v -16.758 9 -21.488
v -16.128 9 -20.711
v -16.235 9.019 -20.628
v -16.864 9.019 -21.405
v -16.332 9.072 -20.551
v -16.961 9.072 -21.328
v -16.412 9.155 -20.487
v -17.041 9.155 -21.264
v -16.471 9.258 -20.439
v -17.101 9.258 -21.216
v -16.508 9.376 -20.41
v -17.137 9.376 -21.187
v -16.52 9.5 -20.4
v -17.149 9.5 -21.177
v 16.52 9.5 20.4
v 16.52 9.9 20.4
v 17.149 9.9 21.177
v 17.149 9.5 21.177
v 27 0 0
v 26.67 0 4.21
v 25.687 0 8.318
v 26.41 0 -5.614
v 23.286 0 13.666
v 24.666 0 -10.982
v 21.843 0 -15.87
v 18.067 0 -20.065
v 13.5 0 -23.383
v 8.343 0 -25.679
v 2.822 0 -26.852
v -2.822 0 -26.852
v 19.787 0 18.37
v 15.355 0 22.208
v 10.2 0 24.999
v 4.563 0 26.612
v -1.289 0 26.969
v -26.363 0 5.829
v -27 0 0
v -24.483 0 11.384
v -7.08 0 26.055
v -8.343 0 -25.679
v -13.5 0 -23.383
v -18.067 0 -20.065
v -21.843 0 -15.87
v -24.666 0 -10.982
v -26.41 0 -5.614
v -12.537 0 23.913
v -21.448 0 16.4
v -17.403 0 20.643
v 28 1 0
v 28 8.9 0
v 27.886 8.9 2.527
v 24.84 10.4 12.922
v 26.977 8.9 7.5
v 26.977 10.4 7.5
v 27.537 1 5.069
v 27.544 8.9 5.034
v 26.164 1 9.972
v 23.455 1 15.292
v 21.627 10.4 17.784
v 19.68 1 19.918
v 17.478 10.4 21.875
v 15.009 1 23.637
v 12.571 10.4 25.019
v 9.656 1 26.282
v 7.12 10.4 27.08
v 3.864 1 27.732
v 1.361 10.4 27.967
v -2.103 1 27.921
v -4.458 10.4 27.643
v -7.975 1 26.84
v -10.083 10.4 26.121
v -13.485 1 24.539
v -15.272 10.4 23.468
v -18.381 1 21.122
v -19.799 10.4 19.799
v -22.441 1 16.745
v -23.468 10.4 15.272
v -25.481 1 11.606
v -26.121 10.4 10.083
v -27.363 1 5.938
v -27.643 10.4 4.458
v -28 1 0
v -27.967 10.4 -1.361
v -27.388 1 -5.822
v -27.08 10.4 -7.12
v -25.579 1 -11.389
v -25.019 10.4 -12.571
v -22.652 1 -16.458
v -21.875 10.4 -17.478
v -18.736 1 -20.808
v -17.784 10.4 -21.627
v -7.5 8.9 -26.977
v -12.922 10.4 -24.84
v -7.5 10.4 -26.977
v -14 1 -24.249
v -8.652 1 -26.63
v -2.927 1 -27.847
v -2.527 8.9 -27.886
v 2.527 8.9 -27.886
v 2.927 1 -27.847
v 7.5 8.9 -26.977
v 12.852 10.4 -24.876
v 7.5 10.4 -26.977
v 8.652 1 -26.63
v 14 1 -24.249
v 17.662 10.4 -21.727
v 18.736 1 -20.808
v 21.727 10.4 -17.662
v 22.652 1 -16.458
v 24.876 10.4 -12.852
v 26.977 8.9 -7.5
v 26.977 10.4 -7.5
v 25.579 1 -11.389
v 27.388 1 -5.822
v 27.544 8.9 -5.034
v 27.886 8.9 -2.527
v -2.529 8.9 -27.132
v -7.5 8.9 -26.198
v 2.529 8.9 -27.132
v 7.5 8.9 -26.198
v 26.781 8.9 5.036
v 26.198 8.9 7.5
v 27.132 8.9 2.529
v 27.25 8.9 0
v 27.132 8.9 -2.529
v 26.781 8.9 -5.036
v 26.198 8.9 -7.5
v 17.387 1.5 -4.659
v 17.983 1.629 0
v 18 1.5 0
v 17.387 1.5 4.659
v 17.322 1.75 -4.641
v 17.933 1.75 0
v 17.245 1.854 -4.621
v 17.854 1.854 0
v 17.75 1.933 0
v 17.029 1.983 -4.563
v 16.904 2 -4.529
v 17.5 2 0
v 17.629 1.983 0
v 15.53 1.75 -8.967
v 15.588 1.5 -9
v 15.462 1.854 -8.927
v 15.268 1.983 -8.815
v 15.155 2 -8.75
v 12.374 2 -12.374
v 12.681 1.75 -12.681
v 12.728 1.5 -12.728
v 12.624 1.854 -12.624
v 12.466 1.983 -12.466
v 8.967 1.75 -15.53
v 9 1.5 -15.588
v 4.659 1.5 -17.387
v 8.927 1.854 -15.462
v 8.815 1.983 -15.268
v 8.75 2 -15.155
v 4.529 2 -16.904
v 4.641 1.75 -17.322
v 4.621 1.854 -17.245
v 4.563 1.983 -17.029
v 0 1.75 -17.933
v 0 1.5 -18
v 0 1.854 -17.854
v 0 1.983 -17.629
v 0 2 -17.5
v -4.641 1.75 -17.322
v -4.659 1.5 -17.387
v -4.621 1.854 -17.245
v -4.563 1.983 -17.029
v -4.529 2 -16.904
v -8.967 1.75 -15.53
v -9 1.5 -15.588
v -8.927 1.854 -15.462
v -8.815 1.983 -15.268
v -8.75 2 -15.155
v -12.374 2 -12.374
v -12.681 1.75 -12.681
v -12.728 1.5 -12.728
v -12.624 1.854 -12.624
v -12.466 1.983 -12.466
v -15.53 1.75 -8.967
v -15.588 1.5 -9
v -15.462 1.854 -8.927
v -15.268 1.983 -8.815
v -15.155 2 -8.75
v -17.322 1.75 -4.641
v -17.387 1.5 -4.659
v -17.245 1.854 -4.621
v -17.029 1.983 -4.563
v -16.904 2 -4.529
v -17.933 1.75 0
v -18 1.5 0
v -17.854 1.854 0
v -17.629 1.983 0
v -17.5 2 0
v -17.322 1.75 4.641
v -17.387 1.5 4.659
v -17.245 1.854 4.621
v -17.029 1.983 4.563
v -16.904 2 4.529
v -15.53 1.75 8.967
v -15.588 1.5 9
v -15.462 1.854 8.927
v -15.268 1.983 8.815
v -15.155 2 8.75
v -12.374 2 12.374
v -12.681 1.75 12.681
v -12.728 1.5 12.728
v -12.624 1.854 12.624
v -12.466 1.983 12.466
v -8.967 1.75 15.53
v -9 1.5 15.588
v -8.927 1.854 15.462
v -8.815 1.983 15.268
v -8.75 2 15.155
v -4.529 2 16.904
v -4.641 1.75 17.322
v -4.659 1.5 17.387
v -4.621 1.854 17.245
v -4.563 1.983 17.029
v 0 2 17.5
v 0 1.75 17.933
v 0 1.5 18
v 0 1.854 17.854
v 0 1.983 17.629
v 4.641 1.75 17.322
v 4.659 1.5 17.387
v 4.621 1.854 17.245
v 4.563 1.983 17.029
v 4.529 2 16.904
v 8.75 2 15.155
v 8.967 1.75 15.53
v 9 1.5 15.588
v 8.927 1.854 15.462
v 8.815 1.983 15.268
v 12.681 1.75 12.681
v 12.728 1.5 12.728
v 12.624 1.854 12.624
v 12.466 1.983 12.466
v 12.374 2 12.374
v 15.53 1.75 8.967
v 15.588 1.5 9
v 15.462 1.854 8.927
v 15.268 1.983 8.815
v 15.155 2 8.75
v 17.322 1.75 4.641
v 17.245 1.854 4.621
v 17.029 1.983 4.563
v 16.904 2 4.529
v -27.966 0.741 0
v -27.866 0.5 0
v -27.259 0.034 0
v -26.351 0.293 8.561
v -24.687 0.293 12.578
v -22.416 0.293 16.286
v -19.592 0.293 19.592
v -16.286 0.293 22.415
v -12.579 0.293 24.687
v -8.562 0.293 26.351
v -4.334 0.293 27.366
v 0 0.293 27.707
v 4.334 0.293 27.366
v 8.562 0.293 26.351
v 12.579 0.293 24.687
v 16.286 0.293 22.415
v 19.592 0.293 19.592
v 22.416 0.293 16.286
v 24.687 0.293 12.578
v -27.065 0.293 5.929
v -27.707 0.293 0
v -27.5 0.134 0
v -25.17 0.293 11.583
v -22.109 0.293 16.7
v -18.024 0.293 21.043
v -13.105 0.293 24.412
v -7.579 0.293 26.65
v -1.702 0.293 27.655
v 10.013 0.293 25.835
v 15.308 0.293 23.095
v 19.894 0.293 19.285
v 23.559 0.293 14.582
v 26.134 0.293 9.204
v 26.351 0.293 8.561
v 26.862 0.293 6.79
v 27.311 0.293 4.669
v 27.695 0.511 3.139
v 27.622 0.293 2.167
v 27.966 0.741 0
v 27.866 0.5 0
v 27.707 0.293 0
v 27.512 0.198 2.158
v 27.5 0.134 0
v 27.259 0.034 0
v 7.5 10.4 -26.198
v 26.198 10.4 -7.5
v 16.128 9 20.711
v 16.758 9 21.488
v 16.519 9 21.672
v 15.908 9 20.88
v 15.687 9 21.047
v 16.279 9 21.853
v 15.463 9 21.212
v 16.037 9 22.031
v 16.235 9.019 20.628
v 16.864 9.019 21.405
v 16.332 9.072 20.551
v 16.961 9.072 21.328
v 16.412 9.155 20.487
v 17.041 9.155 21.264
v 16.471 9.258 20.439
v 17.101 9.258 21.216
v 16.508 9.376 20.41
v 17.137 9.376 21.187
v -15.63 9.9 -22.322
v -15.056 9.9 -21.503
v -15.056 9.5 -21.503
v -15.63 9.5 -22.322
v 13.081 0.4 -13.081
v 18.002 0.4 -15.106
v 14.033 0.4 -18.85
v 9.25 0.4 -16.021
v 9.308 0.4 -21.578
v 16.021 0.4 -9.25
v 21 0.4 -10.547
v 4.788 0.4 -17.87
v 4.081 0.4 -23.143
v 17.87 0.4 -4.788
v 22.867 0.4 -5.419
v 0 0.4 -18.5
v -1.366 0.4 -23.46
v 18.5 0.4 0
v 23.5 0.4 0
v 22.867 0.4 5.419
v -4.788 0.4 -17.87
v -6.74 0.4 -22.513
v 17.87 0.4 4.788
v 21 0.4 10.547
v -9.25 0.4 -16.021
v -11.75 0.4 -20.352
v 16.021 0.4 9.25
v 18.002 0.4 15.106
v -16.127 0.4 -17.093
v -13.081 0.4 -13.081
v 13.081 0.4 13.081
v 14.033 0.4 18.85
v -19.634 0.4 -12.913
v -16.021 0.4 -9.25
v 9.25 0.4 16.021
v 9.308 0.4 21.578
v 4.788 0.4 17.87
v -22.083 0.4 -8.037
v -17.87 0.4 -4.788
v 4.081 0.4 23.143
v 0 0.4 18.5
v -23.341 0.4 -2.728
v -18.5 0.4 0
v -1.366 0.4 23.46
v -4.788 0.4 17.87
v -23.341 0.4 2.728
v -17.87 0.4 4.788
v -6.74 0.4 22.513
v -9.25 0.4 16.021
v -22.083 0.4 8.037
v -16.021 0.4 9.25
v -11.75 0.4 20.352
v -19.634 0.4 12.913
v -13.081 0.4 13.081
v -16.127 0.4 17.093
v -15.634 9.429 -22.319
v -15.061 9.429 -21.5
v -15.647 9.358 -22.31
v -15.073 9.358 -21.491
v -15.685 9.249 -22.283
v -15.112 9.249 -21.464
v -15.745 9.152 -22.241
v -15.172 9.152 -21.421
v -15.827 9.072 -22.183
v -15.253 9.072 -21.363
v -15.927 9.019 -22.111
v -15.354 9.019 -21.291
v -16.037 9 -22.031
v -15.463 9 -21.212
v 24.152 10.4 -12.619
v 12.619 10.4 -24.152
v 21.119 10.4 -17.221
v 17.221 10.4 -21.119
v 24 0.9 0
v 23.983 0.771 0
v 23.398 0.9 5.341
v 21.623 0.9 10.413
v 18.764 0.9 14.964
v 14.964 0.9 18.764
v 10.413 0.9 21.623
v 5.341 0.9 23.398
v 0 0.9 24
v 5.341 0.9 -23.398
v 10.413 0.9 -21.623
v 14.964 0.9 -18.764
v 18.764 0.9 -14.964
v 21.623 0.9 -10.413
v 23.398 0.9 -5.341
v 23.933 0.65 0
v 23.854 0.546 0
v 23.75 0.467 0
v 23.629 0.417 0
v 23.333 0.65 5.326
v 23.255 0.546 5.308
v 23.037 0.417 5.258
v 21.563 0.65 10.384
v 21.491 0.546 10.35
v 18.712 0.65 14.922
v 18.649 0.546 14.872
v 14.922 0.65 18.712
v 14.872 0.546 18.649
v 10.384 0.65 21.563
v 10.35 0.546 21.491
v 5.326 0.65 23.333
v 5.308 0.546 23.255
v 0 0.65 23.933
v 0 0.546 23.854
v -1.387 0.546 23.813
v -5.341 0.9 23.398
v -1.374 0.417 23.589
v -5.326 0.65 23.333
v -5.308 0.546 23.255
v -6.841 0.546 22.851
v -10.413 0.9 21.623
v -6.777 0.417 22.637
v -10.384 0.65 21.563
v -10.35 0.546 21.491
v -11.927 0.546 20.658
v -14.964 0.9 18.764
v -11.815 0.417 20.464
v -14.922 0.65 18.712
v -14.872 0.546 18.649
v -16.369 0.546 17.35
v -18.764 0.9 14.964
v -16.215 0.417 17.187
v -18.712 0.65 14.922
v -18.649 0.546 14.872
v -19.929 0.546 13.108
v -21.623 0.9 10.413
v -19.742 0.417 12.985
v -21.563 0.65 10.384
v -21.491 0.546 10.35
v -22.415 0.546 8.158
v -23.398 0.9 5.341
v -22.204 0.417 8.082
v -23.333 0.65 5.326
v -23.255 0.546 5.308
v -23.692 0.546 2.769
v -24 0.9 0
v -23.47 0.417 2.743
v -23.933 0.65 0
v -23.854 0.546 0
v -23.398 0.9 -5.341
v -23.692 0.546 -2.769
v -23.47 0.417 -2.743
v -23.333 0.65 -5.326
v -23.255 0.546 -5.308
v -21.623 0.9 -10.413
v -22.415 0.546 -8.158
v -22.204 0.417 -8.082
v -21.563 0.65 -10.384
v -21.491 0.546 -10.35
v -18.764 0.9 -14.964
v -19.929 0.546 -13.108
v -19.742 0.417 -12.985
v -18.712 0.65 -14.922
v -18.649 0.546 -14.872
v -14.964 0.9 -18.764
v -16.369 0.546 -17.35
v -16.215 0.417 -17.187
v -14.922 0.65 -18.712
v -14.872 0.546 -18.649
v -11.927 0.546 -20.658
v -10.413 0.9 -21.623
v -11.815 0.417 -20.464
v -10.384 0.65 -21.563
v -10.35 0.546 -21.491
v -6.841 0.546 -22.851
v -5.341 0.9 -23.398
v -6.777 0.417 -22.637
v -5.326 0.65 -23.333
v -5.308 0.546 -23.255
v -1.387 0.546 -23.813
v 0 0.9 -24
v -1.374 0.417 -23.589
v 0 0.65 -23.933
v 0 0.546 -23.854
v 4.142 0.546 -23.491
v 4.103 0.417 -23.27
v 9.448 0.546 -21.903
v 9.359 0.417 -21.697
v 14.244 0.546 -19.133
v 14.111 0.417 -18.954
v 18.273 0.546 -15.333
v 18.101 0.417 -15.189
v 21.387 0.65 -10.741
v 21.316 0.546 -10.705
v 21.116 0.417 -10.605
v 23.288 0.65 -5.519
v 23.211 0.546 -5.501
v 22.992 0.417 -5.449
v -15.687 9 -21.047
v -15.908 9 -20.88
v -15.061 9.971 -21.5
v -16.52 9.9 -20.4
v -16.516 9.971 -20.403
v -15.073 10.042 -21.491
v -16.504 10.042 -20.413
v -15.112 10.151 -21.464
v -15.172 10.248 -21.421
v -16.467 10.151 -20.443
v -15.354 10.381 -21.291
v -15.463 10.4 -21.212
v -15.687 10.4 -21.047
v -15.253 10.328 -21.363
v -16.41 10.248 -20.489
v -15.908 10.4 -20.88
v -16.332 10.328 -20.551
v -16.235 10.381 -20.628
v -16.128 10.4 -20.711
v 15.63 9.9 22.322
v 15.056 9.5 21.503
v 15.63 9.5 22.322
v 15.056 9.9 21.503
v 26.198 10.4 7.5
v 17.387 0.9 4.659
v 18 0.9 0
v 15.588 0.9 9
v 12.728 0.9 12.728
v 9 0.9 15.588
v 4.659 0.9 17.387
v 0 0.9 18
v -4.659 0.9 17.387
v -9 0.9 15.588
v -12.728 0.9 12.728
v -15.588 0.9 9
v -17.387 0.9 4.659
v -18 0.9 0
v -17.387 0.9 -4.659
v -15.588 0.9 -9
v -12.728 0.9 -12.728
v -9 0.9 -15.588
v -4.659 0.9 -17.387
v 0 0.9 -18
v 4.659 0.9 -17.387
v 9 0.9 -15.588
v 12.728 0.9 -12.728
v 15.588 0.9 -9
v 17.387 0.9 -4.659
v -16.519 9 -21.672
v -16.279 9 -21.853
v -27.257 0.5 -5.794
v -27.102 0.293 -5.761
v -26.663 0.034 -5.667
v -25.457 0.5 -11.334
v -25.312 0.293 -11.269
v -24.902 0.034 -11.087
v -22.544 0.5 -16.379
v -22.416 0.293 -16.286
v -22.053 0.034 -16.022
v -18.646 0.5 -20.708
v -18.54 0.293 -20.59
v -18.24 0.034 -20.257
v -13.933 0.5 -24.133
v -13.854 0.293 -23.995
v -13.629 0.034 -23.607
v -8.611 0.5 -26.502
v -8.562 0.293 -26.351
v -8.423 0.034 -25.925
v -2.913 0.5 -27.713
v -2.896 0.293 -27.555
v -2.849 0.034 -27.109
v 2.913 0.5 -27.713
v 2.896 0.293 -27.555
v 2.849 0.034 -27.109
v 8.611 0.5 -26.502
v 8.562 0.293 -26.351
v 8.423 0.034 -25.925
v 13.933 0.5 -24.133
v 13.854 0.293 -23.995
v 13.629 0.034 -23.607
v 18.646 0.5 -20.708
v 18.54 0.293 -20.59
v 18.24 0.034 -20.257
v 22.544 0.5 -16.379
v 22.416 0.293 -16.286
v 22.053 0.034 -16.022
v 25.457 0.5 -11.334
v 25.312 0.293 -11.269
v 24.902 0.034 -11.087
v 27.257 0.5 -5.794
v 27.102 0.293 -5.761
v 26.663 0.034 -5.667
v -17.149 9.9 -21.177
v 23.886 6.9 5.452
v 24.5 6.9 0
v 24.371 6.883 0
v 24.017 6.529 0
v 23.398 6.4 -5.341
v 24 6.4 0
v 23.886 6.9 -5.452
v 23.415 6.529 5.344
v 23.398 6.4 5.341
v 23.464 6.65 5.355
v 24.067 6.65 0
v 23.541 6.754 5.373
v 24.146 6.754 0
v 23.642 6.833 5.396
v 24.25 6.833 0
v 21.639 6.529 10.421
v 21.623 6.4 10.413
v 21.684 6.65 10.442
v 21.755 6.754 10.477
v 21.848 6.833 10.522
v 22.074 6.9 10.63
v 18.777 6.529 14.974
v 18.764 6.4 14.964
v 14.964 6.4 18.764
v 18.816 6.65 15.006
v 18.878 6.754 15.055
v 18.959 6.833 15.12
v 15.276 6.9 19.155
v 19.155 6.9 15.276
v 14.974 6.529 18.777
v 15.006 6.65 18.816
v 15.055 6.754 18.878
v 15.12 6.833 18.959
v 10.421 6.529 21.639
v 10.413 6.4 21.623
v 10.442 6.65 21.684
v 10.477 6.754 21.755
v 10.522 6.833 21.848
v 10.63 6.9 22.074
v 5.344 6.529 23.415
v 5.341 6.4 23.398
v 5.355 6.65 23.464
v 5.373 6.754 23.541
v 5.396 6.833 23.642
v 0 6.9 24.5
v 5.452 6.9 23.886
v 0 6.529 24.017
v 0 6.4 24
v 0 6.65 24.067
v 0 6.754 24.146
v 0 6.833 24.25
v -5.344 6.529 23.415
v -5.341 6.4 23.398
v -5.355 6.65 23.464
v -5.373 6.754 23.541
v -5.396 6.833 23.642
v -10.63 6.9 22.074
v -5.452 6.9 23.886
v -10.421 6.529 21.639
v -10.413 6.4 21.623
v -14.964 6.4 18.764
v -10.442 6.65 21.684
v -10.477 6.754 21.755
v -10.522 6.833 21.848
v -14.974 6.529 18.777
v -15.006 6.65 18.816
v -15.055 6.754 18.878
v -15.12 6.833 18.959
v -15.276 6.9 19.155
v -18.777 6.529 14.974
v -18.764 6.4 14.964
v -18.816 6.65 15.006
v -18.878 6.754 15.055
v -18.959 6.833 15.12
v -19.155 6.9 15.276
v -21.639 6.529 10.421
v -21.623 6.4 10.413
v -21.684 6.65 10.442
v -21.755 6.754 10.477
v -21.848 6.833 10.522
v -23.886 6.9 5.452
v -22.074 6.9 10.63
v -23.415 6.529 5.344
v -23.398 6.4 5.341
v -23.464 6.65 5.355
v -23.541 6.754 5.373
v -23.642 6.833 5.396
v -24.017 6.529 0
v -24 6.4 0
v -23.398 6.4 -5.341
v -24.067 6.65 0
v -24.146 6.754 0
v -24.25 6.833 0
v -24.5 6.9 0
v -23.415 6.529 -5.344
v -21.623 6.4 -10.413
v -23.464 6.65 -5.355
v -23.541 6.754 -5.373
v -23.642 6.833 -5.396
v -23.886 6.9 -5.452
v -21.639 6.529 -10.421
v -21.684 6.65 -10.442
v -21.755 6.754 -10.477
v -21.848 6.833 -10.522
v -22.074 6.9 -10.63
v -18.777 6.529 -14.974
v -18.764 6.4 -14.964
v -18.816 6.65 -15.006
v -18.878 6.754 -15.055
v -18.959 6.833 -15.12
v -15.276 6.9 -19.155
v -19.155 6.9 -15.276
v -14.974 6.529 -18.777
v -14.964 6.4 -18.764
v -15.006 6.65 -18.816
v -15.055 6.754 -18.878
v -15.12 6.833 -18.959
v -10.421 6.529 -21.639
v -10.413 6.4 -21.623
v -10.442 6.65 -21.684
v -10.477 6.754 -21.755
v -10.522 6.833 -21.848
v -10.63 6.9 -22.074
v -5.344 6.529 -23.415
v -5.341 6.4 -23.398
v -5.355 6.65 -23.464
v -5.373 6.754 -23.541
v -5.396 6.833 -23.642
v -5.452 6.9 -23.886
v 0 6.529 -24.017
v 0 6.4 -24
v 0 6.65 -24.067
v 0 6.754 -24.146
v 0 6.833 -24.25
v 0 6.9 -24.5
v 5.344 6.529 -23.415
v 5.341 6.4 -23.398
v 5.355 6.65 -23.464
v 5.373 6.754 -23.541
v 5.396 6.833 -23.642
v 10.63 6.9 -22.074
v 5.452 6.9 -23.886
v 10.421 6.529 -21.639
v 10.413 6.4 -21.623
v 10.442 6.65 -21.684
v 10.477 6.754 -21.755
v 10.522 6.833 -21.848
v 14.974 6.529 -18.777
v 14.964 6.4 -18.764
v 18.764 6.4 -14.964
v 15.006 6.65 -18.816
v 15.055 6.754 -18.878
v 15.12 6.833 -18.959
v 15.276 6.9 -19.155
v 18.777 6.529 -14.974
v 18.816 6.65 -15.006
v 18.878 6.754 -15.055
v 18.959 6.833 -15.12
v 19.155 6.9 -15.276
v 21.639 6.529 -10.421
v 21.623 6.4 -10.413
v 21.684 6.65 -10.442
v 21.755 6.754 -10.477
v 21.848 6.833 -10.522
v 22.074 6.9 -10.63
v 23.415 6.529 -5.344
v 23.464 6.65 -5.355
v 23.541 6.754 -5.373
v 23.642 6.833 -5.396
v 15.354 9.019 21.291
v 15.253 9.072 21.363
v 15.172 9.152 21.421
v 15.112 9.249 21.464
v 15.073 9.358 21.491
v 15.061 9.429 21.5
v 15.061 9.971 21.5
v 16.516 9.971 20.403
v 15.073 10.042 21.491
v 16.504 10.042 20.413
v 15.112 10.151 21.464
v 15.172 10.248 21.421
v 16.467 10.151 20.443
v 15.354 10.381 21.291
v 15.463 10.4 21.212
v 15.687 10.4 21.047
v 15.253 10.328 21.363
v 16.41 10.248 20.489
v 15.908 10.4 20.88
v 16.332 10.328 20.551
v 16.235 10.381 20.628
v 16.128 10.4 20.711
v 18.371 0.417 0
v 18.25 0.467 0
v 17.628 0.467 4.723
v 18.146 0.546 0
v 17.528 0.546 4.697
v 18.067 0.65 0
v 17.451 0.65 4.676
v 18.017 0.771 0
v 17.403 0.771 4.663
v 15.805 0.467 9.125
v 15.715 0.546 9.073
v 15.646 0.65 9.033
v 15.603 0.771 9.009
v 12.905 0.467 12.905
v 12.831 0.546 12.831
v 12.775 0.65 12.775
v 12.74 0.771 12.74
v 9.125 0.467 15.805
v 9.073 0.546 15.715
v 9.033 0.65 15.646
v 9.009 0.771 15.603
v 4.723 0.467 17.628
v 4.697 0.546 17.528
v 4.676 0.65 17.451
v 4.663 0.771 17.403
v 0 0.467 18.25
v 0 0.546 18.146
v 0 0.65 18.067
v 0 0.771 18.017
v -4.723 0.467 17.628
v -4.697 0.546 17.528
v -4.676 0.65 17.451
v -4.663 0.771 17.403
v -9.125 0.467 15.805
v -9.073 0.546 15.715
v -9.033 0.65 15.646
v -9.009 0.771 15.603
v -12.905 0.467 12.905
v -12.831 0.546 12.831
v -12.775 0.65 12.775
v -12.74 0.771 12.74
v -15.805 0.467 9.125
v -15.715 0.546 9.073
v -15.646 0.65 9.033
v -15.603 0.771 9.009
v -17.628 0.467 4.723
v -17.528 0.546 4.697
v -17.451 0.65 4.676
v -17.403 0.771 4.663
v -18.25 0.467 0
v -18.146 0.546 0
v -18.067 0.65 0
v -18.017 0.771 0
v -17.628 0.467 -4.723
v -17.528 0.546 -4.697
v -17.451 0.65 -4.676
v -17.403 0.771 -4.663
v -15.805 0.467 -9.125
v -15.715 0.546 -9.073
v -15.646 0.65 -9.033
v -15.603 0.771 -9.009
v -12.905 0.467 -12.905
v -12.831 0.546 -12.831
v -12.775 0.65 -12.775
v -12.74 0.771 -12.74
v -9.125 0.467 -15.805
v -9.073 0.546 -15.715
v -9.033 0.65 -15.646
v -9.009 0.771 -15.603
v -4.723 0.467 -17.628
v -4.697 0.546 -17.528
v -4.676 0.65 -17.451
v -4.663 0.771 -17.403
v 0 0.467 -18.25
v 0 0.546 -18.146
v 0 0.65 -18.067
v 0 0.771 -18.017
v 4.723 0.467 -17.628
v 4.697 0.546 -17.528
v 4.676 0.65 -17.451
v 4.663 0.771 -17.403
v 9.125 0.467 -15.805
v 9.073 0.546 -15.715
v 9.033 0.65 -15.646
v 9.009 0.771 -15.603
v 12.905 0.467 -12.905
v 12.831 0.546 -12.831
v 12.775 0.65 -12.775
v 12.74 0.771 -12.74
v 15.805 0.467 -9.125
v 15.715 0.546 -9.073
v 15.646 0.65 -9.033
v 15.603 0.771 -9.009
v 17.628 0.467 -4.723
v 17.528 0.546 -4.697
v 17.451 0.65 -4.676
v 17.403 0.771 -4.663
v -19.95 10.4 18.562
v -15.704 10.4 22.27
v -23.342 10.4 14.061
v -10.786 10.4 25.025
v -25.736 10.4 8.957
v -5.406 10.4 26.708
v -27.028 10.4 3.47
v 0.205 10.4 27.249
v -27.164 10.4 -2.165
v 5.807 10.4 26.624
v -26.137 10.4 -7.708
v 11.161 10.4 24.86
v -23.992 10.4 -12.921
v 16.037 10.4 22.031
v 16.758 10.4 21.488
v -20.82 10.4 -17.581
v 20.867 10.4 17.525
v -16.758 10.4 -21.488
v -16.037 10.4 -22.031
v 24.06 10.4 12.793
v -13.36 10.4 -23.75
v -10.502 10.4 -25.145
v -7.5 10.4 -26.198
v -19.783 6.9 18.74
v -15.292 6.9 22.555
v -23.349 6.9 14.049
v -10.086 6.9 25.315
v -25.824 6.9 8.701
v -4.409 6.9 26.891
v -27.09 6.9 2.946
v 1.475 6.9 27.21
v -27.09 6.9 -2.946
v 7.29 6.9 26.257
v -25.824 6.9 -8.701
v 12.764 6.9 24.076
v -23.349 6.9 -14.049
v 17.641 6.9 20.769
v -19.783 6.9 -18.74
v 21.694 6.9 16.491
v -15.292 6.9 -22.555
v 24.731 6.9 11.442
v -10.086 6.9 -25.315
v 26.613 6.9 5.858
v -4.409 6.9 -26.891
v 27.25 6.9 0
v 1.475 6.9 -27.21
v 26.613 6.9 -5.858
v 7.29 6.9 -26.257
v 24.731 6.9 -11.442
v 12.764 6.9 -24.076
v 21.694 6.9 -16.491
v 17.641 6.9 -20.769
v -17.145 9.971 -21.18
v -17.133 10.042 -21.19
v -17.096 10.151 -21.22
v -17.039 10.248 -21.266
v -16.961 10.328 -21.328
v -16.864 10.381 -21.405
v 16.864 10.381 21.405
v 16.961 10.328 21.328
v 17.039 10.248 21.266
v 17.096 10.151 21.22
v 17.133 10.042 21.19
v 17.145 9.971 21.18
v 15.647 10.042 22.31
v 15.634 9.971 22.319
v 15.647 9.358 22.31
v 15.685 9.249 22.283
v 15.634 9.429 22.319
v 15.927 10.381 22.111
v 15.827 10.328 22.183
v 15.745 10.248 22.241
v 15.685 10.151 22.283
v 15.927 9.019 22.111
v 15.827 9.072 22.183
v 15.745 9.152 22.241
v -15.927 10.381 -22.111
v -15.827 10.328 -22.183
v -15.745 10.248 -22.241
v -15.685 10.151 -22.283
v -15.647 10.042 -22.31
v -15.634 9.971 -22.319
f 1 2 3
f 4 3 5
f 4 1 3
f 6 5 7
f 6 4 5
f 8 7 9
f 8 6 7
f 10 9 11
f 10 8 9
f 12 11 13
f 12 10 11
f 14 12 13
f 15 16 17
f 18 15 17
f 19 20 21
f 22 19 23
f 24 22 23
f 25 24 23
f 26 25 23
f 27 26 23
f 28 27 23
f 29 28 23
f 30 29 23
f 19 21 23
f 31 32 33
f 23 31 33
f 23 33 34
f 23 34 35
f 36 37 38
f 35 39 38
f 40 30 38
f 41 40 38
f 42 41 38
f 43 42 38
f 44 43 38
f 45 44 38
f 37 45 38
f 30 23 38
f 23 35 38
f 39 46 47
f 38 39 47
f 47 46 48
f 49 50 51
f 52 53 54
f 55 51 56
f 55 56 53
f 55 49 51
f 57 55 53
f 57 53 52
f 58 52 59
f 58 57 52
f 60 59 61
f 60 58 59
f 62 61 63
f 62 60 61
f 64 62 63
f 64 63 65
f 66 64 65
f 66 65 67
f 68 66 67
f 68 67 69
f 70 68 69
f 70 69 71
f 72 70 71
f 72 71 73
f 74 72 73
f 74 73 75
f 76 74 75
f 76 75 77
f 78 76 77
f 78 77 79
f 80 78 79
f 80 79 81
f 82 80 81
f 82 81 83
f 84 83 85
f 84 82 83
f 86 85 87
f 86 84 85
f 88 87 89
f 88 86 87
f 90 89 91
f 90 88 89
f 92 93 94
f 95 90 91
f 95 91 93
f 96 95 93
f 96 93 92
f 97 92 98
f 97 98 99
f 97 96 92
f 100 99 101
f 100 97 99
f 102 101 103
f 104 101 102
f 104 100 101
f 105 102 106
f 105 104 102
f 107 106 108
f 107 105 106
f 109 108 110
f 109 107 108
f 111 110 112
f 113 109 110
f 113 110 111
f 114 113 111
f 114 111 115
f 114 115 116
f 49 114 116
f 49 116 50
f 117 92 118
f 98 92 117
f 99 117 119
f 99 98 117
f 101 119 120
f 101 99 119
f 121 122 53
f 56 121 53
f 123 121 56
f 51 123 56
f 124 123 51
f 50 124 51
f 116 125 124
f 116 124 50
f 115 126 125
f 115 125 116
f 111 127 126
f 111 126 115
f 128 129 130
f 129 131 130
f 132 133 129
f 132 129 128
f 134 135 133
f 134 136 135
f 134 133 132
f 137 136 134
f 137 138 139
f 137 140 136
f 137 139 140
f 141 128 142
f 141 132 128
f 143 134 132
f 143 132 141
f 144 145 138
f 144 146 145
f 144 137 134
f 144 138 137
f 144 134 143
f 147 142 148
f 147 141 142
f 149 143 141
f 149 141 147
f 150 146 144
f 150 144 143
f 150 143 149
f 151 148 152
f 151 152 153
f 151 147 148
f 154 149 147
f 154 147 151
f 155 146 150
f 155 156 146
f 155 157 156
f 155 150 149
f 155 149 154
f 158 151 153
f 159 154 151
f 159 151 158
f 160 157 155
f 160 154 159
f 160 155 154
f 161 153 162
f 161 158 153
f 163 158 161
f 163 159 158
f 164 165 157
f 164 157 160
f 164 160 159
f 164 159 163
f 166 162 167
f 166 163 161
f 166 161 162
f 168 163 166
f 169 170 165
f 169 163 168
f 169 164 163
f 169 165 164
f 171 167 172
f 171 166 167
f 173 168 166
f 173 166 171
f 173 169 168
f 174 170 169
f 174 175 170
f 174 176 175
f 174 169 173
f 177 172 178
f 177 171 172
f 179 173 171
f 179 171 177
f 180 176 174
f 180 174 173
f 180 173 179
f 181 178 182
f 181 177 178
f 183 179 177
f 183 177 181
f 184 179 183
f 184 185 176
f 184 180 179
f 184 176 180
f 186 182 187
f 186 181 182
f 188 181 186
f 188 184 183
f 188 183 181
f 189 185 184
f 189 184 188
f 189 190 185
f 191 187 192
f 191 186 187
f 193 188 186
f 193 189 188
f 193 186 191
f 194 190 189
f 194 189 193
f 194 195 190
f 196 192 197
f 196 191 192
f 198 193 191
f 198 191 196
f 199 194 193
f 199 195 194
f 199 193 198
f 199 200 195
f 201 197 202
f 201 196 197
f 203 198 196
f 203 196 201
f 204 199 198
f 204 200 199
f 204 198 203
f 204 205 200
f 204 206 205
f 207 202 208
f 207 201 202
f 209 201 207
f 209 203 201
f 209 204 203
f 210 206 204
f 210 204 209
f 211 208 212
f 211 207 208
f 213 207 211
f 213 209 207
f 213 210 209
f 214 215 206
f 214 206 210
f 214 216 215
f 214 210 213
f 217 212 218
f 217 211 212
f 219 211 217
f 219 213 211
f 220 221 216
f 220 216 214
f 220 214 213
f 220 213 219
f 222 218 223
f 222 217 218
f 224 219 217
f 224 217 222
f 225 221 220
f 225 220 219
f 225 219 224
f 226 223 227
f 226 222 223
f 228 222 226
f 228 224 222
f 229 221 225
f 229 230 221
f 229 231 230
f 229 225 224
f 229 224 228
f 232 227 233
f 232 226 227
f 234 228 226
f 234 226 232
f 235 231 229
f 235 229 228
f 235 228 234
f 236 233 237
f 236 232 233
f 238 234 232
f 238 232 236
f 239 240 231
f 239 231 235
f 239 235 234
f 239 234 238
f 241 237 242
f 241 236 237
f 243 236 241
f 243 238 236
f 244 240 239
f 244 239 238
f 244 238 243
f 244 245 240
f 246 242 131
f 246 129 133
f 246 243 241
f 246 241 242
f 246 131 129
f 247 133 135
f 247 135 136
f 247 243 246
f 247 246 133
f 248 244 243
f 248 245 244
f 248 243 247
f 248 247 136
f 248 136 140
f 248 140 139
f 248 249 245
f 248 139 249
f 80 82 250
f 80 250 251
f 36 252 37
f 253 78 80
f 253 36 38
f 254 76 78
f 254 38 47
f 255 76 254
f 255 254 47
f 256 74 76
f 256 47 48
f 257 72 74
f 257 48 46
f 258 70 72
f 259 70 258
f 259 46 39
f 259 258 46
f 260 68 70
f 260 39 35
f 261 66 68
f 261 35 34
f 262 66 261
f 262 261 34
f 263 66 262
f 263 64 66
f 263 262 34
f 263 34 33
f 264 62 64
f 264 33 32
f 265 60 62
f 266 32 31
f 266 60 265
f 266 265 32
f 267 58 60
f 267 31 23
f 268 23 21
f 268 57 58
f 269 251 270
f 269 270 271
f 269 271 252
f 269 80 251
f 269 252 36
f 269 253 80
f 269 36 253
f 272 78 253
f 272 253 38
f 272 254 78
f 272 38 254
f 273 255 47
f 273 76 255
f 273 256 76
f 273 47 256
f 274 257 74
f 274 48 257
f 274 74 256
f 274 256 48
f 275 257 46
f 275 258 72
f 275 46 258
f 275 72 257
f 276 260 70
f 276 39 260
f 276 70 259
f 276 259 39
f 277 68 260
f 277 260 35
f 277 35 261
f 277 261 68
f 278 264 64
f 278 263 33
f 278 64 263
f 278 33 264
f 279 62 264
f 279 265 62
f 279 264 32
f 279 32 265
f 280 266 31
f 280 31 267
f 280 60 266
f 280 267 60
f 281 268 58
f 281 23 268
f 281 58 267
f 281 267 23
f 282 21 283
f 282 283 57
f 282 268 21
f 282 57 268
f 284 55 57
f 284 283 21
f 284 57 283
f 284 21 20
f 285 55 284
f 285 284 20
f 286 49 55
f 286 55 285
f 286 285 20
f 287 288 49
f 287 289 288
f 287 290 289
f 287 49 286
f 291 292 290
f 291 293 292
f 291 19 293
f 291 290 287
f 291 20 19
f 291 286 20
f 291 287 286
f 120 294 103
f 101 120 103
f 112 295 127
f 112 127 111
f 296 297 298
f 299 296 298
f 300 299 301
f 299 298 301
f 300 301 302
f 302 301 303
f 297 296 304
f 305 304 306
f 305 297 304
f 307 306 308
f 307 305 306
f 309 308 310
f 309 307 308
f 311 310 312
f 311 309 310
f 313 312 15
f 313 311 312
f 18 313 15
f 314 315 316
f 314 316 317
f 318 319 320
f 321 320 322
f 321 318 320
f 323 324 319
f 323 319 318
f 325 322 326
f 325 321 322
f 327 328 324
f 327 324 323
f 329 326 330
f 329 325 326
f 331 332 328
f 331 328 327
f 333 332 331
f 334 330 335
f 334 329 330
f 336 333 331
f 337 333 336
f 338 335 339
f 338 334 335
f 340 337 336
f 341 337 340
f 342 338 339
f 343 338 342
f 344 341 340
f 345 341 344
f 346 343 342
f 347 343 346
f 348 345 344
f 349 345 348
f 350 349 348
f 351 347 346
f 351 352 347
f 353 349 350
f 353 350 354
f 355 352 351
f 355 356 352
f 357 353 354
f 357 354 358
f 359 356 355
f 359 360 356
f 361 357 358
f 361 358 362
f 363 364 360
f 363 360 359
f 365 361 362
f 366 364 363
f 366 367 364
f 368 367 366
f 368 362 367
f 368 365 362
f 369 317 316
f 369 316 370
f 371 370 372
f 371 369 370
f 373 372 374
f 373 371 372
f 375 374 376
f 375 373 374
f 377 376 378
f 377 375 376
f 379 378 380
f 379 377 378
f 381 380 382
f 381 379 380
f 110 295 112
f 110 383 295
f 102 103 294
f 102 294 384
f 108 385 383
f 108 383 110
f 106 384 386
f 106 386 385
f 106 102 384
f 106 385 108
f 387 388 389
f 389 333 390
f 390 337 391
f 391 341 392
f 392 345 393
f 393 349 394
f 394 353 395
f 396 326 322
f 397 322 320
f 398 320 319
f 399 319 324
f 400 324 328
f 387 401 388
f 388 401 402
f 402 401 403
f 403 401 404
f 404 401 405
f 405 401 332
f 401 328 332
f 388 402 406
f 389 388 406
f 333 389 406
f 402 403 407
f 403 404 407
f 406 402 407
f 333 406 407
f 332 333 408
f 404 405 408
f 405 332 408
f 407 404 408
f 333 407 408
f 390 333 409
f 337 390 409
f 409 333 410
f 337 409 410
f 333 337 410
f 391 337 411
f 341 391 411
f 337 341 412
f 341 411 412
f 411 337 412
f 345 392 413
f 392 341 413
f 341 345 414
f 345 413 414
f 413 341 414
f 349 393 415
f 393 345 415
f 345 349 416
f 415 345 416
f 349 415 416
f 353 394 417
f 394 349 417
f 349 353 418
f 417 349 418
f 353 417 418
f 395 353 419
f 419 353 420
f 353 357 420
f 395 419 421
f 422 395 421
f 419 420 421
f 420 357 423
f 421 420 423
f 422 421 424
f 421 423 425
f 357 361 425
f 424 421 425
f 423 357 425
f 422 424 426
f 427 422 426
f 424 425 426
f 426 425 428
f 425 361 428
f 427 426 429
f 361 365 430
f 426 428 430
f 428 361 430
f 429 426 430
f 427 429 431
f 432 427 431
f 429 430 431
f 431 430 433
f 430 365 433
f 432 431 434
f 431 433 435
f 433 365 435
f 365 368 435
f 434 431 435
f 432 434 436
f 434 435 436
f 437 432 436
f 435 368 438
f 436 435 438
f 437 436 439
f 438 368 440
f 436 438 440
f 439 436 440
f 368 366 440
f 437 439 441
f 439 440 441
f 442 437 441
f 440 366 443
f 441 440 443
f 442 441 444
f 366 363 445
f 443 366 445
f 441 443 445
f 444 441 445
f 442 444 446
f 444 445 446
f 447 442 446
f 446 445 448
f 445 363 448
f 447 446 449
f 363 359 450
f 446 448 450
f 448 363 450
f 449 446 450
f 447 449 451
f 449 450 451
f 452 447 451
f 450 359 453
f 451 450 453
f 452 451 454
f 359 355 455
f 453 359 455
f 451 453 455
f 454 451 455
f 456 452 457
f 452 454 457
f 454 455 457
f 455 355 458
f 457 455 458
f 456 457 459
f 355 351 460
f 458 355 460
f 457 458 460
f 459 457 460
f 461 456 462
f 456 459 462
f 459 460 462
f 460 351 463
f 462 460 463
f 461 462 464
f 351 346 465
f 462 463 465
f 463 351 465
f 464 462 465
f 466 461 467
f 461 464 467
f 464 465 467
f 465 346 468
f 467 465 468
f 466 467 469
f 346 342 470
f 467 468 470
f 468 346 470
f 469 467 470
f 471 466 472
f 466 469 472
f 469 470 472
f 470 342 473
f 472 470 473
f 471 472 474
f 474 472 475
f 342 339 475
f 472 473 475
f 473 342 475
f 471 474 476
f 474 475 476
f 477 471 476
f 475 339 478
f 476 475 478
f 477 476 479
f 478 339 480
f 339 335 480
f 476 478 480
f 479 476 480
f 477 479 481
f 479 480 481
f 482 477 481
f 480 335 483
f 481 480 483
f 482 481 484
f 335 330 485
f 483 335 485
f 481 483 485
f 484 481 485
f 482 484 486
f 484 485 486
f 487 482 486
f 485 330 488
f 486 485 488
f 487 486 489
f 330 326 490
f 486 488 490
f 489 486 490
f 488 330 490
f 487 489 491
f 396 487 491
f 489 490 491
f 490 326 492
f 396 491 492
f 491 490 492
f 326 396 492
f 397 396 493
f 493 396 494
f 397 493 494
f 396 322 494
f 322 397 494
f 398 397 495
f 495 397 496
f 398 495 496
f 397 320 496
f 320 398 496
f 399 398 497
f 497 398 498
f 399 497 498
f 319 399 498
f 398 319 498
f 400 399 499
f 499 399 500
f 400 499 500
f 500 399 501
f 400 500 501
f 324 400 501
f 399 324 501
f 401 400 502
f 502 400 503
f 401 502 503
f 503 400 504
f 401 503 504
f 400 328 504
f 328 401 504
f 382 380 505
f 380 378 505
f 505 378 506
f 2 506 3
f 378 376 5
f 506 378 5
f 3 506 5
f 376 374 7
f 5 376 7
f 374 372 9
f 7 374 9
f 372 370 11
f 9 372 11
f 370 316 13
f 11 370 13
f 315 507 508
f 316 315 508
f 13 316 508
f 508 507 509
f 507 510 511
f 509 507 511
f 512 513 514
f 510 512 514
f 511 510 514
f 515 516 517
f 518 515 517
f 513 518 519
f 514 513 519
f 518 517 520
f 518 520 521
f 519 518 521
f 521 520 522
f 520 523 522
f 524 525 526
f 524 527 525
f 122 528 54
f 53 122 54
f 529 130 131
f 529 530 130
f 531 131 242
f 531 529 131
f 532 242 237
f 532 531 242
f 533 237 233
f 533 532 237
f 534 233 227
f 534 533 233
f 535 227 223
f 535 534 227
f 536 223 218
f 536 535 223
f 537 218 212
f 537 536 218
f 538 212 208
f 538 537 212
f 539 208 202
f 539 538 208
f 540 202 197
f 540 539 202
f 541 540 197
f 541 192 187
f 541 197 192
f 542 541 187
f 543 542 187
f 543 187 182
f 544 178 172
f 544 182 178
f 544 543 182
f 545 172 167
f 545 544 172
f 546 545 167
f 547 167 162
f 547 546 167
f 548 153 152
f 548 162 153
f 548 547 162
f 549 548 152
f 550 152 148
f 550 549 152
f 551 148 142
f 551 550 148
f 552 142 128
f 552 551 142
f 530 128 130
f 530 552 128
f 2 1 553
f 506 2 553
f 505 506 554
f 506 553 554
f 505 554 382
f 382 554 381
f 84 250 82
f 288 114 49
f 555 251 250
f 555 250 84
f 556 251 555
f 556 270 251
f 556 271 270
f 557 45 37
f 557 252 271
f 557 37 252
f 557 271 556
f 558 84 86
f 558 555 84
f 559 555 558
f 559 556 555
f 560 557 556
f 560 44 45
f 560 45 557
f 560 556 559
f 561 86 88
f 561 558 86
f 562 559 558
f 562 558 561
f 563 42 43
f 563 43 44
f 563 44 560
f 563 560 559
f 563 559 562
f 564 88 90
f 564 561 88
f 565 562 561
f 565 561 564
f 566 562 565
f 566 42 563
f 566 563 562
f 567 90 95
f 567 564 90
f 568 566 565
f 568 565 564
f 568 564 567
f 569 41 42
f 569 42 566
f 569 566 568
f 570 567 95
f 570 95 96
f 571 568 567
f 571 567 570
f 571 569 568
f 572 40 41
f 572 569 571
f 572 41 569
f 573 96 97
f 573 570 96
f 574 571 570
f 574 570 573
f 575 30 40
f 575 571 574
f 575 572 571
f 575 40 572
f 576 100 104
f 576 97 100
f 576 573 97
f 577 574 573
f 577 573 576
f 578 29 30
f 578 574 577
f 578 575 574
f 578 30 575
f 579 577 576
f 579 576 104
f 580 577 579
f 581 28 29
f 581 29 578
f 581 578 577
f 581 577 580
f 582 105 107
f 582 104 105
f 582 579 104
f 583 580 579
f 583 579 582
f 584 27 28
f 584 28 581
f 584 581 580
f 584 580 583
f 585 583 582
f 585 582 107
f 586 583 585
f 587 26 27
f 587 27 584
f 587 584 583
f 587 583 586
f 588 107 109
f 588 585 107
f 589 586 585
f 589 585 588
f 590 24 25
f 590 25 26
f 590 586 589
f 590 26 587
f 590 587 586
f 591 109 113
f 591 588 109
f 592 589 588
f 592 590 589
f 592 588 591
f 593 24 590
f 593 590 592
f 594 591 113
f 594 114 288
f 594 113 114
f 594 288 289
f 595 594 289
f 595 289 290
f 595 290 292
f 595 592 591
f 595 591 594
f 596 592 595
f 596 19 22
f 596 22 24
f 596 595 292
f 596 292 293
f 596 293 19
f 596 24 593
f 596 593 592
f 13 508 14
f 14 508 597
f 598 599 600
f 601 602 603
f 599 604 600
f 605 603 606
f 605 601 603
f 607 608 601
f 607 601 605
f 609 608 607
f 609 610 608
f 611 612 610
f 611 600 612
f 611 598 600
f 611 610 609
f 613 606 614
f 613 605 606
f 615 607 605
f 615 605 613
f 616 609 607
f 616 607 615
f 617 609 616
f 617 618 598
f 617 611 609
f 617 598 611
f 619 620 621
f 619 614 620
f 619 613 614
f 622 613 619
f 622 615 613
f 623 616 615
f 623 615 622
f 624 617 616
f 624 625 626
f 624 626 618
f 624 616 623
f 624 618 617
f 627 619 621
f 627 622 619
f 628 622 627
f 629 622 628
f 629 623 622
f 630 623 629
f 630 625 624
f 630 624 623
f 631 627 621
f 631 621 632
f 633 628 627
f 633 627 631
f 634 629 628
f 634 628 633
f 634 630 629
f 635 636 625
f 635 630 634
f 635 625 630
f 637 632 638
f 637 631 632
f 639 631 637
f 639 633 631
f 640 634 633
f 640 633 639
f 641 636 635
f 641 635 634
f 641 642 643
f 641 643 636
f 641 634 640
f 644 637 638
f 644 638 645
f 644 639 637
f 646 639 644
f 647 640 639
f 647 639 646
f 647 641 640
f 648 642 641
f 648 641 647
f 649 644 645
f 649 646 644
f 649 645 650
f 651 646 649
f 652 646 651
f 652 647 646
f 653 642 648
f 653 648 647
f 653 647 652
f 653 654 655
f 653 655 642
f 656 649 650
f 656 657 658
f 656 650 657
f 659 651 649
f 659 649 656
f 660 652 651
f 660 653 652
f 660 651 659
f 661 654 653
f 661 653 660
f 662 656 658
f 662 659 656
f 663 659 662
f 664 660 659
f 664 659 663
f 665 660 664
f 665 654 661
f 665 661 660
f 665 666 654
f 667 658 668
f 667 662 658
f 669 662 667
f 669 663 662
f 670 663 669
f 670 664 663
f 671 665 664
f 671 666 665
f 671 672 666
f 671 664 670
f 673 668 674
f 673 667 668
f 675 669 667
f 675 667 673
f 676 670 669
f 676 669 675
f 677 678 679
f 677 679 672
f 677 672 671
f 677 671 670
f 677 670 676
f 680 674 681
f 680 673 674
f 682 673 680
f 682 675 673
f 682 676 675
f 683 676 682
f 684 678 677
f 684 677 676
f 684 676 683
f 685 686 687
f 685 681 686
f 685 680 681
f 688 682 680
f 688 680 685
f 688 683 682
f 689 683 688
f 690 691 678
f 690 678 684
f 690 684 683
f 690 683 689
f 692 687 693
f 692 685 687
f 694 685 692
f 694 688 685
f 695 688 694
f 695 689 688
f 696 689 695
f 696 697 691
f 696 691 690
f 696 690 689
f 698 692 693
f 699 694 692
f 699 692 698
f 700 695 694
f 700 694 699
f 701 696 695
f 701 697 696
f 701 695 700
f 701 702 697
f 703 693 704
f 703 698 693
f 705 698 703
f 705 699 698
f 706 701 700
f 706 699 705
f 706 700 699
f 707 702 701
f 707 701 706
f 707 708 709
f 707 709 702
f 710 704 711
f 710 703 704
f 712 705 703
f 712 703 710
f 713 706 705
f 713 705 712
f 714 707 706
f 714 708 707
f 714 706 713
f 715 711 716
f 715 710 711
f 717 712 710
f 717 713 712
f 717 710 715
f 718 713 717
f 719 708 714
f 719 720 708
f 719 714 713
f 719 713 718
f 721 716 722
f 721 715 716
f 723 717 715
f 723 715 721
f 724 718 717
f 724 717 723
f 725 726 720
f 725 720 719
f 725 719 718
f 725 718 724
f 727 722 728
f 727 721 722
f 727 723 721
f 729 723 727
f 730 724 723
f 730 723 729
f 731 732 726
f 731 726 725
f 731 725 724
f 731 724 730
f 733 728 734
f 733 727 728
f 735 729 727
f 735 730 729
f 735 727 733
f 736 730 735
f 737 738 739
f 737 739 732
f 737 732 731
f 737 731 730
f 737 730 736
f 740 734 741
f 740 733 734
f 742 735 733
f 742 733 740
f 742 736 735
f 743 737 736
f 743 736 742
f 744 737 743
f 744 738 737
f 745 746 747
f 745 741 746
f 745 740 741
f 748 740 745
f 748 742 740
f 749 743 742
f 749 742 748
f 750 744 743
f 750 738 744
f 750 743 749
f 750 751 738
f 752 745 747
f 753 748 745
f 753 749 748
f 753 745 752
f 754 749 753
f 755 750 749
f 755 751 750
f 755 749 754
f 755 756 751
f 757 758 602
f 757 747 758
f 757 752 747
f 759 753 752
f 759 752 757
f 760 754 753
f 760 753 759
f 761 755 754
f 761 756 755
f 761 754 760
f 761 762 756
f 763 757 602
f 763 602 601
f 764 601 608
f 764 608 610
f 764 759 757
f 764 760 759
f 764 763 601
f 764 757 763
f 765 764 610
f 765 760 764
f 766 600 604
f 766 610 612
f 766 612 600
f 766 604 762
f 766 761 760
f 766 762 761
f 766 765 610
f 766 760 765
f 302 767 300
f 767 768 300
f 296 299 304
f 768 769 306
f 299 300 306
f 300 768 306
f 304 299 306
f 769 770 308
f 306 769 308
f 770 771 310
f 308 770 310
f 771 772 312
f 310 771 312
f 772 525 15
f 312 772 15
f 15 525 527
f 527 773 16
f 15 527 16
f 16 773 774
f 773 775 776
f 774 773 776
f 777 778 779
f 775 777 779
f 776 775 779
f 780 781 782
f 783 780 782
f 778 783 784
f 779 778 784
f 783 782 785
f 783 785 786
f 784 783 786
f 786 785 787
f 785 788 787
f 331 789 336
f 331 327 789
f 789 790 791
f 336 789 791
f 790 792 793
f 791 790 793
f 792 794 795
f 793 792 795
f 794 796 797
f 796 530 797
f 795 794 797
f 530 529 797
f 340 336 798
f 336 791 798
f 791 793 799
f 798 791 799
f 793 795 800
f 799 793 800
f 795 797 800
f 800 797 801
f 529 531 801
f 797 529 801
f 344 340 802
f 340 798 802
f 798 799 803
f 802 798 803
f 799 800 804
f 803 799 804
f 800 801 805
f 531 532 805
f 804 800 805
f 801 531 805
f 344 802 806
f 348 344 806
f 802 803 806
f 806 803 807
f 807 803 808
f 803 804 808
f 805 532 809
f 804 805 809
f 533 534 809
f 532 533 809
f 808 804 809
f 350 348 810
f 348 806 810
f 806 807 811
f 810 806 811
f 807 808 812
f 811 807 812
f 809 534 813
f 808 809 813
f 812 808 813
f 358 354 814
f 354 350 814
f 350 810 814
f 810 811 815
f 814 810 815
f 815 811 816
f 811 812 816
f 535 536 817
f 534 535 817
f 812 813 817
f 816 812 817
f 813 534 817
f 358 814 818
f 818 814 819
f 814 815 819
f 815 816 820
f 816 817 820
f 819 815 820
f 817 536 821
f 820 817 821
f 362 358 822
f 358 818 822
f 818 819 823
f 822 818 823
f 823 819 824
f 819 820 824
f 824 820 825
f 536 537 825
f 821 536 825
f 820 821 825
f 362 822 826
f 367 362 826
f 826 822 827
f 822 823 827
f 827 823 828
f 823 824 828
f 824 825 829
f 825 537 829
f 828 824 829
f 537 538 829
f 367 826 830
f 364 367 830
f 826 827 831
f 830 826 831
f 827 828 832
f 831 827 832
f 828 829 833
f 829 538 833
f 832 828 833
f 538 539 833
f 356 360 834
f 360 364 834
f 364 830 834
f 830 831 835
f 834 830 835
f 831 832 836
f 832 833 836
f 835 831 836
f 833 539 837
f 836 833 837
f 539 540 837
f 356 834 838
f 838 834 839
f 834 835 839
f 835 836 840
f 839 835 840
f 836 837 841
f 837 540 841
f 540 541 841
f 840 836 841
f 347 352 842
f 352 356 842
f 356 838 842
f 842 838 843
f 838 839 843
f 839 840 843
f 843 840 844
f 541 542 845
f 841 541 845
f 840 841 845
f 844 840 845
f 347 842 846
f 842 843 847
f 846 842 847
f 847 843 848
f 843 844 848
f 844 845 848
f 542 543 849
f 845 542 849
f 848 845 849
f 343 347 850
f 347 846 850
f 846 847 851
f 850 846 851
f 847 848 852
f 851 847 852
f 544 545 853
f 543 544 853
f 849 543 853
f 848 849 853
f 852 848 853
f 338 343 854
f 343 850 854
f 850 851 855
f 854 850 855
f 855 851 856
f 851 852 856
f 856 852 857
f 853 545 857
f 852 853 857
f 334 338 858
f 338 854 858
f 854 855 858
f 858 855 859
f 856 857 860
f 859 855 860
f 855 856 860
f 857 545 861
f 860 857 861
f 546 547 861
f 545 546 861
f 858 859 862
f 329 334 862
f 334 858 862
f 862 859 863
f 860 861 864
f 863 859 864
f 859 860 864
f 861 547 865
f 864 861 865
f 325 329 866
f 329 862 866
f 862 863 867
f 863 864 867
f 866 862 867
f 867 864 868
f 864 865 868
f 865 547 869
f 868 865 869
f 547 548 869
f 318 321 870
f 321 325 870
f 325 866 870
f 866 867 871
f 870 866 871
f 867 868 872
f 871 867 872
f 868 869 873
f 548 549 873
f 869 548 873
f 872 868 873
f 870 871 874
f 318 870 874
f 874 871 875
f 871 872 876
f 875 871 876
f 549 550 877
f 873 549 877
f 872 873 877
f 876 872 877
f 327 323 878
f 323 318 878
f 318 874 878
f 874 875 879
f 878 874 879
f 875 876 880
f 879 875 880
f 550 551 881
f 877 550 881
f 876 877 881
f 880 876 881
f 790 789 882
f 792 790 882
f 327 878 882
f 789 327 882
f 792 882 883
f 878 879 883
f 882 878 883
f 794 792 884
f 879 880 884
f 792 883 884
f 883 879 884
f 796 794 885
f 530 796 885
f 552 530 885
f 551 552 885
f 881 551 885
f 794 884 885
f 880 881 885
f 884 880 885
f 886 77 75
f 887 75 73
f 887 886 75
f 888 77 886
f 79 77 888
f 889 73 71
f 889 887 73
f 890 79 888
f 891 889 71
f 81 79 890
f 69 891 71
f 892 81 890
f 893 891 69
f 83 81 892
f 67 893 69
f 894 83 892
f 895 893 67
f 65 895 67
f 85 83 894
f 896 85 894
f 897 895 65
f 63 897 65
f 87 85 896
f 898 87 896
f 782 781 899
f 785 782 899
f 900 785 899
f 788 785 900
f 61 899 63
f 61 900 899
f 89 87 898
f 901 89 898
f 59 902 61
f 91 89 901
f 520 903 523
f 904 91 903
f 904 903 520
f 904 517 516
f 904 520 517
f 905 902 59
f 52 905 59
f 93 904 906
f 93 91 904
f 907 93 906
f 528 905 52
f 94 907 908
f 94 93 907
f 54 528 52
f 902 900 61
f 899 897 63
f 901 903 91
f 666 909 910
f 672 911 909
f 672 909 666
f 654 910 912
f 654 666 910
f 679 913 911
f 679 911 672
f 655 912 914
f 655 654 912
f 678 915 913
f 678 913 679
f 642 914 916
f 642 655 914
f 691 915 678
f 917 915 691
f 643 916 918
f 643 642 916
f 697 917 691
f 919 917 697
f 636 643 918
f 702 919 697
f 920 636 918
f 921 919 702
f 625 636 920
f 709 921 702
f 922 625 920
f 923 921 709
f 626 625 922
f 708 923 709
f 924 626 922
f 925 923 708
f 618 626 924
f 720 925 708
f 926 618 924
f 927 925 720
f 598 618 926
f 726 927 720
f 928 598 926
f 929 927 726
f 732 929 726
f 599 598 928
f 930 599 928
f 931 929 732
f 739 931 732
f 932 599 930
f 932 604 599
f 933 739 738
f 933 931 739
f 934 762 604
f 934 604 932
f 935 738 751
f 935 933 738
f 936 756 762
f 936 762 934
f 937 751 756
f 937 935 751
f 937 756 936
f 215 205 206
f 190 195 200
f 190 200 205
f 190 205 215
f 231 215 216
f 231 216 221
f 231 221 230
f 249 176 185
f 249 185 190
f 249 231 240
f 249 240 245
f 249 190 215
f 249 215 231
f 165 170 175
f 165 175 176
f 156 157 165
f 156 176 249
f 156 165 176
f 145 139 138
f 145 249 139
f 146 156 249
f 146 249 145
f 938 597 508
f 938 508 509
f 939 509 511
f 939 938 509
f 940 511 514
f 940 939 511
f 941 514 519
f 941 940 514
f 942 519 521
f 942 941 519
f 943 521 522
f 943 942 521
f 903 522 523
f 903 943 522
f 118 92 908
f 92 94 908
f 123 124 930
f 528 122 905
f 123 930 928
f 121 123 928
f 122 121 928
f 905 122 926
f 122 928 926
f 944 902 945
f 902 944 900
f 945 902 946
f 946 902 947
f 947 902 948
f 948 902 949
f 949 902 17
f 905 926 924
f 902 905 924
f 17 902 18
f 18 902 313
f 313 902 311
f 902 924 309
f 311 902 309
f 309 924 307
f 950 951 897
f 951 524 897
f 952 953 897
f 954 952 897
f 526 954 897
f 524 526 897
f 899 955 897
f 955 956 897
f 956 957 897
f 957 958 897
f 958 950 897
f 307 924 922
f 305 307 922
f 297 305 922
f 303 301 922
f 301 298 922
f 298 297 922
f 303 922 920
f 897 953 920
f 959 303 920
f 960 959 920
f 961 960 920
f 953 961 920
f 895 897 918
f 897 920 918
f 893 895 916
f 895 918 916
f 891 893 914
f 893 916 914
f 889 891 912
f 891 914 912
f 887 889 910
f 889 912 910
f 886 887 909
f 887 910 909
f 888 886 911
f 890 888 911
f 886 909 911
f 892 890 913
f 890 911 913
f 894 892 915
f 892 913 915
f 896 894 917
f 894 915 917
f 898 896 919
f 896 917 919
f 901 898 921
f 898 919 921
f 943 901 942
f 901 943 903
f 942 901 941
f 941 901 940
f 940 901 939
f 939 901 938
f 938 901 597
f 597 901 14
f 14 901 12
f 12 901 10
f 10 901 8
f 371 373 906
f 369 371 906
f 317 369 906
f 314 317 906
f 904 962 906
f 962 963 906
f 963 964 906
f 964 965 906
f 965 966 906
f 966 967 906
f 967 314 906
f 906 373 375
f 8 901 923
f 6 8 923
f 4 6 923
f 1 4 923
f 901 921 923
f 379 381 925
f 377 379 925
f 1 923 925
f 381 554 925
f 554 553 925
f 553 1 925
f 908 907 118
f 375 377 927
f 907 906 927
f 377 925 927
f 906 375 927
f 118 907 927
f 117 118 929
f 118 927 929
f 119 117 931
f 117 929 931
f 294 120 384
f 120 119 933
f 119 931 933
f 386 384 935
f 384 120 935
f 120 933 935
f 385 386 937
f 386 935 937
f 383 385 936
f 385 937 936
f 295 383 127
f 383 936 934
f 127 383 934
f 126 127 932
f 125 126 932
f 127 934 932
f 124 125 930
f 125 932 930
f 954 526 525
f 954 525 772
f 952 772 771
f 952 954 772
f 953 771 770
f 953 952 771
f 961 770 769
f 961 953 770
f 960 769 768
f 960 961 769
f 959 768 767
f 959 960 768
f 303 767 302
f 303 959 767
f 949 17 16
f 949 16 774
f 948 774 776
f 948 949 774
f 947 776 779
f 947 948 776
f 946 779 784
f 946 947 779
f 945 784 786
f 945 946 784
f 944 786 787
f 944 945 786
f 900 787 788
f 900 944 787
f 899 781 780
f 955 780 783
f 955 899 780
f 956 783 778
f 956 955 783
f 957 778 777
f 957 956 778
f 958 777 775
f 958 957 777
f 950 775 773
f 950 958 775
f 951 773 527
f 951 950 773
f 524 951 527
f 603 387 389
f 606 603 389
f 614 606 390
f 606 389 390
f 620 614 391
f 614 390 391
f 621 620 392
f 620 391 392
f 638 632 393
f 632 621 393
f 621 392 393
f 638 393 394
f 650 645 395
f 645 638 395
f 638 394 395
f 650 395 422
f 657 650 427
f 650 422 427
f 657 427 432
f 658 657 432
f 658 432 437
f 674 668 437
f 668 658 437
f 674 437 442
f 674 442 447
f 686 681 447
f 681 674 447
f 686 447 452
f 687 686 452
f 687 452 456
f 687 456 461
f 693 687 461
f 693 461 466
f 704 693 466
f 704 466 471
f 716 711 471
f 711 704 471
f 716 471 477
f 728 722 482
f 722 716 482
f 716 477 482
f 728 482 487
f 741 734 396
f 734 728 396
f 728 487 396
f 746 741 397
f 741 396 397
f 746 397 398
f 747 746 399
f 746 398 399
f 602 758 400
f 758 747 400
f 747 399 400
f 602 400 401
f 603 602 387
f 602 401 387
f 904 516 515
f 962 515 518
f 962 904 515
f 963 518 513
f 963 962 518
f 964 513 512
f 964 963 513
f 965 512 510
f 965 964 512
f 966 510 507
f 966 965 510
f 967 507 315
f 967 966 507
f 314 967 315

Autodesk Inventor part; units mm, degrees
ref_plane "YZ Plane" through (0, 0, 0) normal (1, 0, 0) x (0, 1, 0)
ref_plane "XZ Plane" through (0, 0, 0) normal (0, 1, 0) x (-1, 0, 0)
ref_plane "XY Plane" through (0, 0, 0) normal (0, 0, 1) x (1, 0, 0)
sketch "Sketch1" plane through (0, 0, 0) normal (0, 1, 0) x (-1, 0, 0)
  circle A0 centre (0, 0) radius 28
  dimension "d7" = 56
extrude "Extrusion1" add sketch "Sketch1" along normal blind 0.4
sketch "Sketch2" plane through (0, 0.4, 0) normal (0, 1, 0) x (1, 0, 0)
  circle A0 centre (0, 0) radius 27.25
  circle A1 centre (0, 0) radius 28
  dimension "d4" = 54.5
  dimension "d8" = 56
extrude "Extrusion2" add sketch "Sketch2" along normal blind 10
sketch "Sketch3" plane through (0, 10.4, 0) normal (0, 1, 0) x (1, 0, 0)
  arc A0 (-15.63, 22.3219) -> (-17.149, 21.1772) centre (0, 0) ccw
  line L0 (0, 0) -> (-17.149, 21.1772) construction
  line L1 (0, 0) -> (27.25, 0) construction
  line L2 (0, 0) -> (-15.63, 22.3219) construction
  arc A1 (-15.0564, 21.5027) -> (-16.5197, 20.4001) centre (0, 0) ccw
  line L3 (0, 0) -> (-16.5197, 20.4001) construction
  line L4 (0, 0) -> (26.25, 0) construction
  line L5 (0, 0) -> (-15.0564, 21.5027) construction
  line L6 (-16.5197, 20.4001) -> (-17.149, 21.1772)
  line L7 (-15.0564, 21.5027) -> (-15.63, 22.3219)
  circle A2 centre (0, 0) radius 27.25 projected
  dimension "d9" = 27.25
  dimension "d10" = 129
  dimension "d11" = 4
  dimension "d12" = 26.25
  dimension "d13" = 129
  dimension "d14" = 4
extrude "Extrusion3" add sketch "Sketch3" against normal blind 1.4 contours L7 A1 L6 A0
fillet "Fillet1" radius 0.5 4 edges at (-15.3432, 9, -21.9123) (-15.3432, 10.4, -21.9123) (-16.8343, 10.4, -20.7887) (-16.8343, 9, -20.7887)
pattern_circular "Circular Pattern1" count 2 over 360 about axis through (0, 0, 0) along (0, 1, 0) of "Extrusion3", "Fillet1"
sketch "Sketch4" plane through (0, 10.4, 0) normal (0, 1, 0) x (1, 0, 0)
  circle A0 centre (0, 0) radius 28 projected
  line L0 (0, 28) -> (-7.5, 28)
  line L1 (-7.5, 28) -> (-7.5, 25)
  line L2 (-7.5, 25) -> (0, 25)
  line L3 (0, 25) -> (0, 28)
  line L4 (0, 25) -> (7.5, 25)
  line L5 (7.5, 25) -> (7.5, 28)
  line L6 (7.5, 28) -> (0, 28)
  line L7 (0, 28) -> (0, 25)
  circle A1 centre (0, 0) radius 28 projected
  line L8 (28, 0) -> (25, 0)
  line L9 (25, 0) -> (25, 7.5)
  line L10 (25, 7.5) -> (28, 7.5)
  line L11 (28, 7.5) -> (28, 0)
  line L12 (28, 0) -> (25, 0)
  line L13 (25, 0) -> (25, -7.5)
  line L14 (25, -7.5) -> (28, -7.5)
  line L15 (28, -7.5) -> (28, 0)
  dimension "d25" = 7.5
  dimension "d26" = 3
  dimension "d27" = 7.5
  dimension "d28" = 3
  dimension "d51" = 3
  dimension "d52" = 7.5
  dimension "d53" = 3
  dimension "d54" = 7.5
extrude "Extrusion4" cut sketch "Sketch4" against normal blind 1.5 contours L8 L9 L10 A0 | L15 L14 A0 | A0 L14 L13 L8 | A0 L10 L11 | L5 L4 L3 A0 | A0 L6 L5 | L1 L0 A0 | A0 L3 L2 L1
sketch "Sketch7" plane through (0, 0.4, 0) normal (0, 1, 0) x (1, 0, 0)
  circle A0 centre (0, 0) radius 24
  circle A1 centre (0, 0) radius 27.25
  dimension "d47" = 48
  dimension "d50" = 54.5
extrude "Extrusion7" add sketch "Sketch7" along normal blind 6.5
sketch "Sketch9" plane through (0, 0.4, 0) normal (0, 1, 0) x (1, 0, 0)
  circle A0 centre (0, 0) radius 18
  dimension "d60" = 36
extrude "Extrusion9" add sketch "Sketch9" along normal blind 1.6
fillet "Fillet5" radius 1 1 edges at (28, 0, 0)
fillet "Fillet5" radius 0.5 4 edges at (-24, 0.4, 0) (-24, 6.9, 0) (-18, 0.4, 0) (-18, 2, 0)
properties part number "Diffuser_V2"
